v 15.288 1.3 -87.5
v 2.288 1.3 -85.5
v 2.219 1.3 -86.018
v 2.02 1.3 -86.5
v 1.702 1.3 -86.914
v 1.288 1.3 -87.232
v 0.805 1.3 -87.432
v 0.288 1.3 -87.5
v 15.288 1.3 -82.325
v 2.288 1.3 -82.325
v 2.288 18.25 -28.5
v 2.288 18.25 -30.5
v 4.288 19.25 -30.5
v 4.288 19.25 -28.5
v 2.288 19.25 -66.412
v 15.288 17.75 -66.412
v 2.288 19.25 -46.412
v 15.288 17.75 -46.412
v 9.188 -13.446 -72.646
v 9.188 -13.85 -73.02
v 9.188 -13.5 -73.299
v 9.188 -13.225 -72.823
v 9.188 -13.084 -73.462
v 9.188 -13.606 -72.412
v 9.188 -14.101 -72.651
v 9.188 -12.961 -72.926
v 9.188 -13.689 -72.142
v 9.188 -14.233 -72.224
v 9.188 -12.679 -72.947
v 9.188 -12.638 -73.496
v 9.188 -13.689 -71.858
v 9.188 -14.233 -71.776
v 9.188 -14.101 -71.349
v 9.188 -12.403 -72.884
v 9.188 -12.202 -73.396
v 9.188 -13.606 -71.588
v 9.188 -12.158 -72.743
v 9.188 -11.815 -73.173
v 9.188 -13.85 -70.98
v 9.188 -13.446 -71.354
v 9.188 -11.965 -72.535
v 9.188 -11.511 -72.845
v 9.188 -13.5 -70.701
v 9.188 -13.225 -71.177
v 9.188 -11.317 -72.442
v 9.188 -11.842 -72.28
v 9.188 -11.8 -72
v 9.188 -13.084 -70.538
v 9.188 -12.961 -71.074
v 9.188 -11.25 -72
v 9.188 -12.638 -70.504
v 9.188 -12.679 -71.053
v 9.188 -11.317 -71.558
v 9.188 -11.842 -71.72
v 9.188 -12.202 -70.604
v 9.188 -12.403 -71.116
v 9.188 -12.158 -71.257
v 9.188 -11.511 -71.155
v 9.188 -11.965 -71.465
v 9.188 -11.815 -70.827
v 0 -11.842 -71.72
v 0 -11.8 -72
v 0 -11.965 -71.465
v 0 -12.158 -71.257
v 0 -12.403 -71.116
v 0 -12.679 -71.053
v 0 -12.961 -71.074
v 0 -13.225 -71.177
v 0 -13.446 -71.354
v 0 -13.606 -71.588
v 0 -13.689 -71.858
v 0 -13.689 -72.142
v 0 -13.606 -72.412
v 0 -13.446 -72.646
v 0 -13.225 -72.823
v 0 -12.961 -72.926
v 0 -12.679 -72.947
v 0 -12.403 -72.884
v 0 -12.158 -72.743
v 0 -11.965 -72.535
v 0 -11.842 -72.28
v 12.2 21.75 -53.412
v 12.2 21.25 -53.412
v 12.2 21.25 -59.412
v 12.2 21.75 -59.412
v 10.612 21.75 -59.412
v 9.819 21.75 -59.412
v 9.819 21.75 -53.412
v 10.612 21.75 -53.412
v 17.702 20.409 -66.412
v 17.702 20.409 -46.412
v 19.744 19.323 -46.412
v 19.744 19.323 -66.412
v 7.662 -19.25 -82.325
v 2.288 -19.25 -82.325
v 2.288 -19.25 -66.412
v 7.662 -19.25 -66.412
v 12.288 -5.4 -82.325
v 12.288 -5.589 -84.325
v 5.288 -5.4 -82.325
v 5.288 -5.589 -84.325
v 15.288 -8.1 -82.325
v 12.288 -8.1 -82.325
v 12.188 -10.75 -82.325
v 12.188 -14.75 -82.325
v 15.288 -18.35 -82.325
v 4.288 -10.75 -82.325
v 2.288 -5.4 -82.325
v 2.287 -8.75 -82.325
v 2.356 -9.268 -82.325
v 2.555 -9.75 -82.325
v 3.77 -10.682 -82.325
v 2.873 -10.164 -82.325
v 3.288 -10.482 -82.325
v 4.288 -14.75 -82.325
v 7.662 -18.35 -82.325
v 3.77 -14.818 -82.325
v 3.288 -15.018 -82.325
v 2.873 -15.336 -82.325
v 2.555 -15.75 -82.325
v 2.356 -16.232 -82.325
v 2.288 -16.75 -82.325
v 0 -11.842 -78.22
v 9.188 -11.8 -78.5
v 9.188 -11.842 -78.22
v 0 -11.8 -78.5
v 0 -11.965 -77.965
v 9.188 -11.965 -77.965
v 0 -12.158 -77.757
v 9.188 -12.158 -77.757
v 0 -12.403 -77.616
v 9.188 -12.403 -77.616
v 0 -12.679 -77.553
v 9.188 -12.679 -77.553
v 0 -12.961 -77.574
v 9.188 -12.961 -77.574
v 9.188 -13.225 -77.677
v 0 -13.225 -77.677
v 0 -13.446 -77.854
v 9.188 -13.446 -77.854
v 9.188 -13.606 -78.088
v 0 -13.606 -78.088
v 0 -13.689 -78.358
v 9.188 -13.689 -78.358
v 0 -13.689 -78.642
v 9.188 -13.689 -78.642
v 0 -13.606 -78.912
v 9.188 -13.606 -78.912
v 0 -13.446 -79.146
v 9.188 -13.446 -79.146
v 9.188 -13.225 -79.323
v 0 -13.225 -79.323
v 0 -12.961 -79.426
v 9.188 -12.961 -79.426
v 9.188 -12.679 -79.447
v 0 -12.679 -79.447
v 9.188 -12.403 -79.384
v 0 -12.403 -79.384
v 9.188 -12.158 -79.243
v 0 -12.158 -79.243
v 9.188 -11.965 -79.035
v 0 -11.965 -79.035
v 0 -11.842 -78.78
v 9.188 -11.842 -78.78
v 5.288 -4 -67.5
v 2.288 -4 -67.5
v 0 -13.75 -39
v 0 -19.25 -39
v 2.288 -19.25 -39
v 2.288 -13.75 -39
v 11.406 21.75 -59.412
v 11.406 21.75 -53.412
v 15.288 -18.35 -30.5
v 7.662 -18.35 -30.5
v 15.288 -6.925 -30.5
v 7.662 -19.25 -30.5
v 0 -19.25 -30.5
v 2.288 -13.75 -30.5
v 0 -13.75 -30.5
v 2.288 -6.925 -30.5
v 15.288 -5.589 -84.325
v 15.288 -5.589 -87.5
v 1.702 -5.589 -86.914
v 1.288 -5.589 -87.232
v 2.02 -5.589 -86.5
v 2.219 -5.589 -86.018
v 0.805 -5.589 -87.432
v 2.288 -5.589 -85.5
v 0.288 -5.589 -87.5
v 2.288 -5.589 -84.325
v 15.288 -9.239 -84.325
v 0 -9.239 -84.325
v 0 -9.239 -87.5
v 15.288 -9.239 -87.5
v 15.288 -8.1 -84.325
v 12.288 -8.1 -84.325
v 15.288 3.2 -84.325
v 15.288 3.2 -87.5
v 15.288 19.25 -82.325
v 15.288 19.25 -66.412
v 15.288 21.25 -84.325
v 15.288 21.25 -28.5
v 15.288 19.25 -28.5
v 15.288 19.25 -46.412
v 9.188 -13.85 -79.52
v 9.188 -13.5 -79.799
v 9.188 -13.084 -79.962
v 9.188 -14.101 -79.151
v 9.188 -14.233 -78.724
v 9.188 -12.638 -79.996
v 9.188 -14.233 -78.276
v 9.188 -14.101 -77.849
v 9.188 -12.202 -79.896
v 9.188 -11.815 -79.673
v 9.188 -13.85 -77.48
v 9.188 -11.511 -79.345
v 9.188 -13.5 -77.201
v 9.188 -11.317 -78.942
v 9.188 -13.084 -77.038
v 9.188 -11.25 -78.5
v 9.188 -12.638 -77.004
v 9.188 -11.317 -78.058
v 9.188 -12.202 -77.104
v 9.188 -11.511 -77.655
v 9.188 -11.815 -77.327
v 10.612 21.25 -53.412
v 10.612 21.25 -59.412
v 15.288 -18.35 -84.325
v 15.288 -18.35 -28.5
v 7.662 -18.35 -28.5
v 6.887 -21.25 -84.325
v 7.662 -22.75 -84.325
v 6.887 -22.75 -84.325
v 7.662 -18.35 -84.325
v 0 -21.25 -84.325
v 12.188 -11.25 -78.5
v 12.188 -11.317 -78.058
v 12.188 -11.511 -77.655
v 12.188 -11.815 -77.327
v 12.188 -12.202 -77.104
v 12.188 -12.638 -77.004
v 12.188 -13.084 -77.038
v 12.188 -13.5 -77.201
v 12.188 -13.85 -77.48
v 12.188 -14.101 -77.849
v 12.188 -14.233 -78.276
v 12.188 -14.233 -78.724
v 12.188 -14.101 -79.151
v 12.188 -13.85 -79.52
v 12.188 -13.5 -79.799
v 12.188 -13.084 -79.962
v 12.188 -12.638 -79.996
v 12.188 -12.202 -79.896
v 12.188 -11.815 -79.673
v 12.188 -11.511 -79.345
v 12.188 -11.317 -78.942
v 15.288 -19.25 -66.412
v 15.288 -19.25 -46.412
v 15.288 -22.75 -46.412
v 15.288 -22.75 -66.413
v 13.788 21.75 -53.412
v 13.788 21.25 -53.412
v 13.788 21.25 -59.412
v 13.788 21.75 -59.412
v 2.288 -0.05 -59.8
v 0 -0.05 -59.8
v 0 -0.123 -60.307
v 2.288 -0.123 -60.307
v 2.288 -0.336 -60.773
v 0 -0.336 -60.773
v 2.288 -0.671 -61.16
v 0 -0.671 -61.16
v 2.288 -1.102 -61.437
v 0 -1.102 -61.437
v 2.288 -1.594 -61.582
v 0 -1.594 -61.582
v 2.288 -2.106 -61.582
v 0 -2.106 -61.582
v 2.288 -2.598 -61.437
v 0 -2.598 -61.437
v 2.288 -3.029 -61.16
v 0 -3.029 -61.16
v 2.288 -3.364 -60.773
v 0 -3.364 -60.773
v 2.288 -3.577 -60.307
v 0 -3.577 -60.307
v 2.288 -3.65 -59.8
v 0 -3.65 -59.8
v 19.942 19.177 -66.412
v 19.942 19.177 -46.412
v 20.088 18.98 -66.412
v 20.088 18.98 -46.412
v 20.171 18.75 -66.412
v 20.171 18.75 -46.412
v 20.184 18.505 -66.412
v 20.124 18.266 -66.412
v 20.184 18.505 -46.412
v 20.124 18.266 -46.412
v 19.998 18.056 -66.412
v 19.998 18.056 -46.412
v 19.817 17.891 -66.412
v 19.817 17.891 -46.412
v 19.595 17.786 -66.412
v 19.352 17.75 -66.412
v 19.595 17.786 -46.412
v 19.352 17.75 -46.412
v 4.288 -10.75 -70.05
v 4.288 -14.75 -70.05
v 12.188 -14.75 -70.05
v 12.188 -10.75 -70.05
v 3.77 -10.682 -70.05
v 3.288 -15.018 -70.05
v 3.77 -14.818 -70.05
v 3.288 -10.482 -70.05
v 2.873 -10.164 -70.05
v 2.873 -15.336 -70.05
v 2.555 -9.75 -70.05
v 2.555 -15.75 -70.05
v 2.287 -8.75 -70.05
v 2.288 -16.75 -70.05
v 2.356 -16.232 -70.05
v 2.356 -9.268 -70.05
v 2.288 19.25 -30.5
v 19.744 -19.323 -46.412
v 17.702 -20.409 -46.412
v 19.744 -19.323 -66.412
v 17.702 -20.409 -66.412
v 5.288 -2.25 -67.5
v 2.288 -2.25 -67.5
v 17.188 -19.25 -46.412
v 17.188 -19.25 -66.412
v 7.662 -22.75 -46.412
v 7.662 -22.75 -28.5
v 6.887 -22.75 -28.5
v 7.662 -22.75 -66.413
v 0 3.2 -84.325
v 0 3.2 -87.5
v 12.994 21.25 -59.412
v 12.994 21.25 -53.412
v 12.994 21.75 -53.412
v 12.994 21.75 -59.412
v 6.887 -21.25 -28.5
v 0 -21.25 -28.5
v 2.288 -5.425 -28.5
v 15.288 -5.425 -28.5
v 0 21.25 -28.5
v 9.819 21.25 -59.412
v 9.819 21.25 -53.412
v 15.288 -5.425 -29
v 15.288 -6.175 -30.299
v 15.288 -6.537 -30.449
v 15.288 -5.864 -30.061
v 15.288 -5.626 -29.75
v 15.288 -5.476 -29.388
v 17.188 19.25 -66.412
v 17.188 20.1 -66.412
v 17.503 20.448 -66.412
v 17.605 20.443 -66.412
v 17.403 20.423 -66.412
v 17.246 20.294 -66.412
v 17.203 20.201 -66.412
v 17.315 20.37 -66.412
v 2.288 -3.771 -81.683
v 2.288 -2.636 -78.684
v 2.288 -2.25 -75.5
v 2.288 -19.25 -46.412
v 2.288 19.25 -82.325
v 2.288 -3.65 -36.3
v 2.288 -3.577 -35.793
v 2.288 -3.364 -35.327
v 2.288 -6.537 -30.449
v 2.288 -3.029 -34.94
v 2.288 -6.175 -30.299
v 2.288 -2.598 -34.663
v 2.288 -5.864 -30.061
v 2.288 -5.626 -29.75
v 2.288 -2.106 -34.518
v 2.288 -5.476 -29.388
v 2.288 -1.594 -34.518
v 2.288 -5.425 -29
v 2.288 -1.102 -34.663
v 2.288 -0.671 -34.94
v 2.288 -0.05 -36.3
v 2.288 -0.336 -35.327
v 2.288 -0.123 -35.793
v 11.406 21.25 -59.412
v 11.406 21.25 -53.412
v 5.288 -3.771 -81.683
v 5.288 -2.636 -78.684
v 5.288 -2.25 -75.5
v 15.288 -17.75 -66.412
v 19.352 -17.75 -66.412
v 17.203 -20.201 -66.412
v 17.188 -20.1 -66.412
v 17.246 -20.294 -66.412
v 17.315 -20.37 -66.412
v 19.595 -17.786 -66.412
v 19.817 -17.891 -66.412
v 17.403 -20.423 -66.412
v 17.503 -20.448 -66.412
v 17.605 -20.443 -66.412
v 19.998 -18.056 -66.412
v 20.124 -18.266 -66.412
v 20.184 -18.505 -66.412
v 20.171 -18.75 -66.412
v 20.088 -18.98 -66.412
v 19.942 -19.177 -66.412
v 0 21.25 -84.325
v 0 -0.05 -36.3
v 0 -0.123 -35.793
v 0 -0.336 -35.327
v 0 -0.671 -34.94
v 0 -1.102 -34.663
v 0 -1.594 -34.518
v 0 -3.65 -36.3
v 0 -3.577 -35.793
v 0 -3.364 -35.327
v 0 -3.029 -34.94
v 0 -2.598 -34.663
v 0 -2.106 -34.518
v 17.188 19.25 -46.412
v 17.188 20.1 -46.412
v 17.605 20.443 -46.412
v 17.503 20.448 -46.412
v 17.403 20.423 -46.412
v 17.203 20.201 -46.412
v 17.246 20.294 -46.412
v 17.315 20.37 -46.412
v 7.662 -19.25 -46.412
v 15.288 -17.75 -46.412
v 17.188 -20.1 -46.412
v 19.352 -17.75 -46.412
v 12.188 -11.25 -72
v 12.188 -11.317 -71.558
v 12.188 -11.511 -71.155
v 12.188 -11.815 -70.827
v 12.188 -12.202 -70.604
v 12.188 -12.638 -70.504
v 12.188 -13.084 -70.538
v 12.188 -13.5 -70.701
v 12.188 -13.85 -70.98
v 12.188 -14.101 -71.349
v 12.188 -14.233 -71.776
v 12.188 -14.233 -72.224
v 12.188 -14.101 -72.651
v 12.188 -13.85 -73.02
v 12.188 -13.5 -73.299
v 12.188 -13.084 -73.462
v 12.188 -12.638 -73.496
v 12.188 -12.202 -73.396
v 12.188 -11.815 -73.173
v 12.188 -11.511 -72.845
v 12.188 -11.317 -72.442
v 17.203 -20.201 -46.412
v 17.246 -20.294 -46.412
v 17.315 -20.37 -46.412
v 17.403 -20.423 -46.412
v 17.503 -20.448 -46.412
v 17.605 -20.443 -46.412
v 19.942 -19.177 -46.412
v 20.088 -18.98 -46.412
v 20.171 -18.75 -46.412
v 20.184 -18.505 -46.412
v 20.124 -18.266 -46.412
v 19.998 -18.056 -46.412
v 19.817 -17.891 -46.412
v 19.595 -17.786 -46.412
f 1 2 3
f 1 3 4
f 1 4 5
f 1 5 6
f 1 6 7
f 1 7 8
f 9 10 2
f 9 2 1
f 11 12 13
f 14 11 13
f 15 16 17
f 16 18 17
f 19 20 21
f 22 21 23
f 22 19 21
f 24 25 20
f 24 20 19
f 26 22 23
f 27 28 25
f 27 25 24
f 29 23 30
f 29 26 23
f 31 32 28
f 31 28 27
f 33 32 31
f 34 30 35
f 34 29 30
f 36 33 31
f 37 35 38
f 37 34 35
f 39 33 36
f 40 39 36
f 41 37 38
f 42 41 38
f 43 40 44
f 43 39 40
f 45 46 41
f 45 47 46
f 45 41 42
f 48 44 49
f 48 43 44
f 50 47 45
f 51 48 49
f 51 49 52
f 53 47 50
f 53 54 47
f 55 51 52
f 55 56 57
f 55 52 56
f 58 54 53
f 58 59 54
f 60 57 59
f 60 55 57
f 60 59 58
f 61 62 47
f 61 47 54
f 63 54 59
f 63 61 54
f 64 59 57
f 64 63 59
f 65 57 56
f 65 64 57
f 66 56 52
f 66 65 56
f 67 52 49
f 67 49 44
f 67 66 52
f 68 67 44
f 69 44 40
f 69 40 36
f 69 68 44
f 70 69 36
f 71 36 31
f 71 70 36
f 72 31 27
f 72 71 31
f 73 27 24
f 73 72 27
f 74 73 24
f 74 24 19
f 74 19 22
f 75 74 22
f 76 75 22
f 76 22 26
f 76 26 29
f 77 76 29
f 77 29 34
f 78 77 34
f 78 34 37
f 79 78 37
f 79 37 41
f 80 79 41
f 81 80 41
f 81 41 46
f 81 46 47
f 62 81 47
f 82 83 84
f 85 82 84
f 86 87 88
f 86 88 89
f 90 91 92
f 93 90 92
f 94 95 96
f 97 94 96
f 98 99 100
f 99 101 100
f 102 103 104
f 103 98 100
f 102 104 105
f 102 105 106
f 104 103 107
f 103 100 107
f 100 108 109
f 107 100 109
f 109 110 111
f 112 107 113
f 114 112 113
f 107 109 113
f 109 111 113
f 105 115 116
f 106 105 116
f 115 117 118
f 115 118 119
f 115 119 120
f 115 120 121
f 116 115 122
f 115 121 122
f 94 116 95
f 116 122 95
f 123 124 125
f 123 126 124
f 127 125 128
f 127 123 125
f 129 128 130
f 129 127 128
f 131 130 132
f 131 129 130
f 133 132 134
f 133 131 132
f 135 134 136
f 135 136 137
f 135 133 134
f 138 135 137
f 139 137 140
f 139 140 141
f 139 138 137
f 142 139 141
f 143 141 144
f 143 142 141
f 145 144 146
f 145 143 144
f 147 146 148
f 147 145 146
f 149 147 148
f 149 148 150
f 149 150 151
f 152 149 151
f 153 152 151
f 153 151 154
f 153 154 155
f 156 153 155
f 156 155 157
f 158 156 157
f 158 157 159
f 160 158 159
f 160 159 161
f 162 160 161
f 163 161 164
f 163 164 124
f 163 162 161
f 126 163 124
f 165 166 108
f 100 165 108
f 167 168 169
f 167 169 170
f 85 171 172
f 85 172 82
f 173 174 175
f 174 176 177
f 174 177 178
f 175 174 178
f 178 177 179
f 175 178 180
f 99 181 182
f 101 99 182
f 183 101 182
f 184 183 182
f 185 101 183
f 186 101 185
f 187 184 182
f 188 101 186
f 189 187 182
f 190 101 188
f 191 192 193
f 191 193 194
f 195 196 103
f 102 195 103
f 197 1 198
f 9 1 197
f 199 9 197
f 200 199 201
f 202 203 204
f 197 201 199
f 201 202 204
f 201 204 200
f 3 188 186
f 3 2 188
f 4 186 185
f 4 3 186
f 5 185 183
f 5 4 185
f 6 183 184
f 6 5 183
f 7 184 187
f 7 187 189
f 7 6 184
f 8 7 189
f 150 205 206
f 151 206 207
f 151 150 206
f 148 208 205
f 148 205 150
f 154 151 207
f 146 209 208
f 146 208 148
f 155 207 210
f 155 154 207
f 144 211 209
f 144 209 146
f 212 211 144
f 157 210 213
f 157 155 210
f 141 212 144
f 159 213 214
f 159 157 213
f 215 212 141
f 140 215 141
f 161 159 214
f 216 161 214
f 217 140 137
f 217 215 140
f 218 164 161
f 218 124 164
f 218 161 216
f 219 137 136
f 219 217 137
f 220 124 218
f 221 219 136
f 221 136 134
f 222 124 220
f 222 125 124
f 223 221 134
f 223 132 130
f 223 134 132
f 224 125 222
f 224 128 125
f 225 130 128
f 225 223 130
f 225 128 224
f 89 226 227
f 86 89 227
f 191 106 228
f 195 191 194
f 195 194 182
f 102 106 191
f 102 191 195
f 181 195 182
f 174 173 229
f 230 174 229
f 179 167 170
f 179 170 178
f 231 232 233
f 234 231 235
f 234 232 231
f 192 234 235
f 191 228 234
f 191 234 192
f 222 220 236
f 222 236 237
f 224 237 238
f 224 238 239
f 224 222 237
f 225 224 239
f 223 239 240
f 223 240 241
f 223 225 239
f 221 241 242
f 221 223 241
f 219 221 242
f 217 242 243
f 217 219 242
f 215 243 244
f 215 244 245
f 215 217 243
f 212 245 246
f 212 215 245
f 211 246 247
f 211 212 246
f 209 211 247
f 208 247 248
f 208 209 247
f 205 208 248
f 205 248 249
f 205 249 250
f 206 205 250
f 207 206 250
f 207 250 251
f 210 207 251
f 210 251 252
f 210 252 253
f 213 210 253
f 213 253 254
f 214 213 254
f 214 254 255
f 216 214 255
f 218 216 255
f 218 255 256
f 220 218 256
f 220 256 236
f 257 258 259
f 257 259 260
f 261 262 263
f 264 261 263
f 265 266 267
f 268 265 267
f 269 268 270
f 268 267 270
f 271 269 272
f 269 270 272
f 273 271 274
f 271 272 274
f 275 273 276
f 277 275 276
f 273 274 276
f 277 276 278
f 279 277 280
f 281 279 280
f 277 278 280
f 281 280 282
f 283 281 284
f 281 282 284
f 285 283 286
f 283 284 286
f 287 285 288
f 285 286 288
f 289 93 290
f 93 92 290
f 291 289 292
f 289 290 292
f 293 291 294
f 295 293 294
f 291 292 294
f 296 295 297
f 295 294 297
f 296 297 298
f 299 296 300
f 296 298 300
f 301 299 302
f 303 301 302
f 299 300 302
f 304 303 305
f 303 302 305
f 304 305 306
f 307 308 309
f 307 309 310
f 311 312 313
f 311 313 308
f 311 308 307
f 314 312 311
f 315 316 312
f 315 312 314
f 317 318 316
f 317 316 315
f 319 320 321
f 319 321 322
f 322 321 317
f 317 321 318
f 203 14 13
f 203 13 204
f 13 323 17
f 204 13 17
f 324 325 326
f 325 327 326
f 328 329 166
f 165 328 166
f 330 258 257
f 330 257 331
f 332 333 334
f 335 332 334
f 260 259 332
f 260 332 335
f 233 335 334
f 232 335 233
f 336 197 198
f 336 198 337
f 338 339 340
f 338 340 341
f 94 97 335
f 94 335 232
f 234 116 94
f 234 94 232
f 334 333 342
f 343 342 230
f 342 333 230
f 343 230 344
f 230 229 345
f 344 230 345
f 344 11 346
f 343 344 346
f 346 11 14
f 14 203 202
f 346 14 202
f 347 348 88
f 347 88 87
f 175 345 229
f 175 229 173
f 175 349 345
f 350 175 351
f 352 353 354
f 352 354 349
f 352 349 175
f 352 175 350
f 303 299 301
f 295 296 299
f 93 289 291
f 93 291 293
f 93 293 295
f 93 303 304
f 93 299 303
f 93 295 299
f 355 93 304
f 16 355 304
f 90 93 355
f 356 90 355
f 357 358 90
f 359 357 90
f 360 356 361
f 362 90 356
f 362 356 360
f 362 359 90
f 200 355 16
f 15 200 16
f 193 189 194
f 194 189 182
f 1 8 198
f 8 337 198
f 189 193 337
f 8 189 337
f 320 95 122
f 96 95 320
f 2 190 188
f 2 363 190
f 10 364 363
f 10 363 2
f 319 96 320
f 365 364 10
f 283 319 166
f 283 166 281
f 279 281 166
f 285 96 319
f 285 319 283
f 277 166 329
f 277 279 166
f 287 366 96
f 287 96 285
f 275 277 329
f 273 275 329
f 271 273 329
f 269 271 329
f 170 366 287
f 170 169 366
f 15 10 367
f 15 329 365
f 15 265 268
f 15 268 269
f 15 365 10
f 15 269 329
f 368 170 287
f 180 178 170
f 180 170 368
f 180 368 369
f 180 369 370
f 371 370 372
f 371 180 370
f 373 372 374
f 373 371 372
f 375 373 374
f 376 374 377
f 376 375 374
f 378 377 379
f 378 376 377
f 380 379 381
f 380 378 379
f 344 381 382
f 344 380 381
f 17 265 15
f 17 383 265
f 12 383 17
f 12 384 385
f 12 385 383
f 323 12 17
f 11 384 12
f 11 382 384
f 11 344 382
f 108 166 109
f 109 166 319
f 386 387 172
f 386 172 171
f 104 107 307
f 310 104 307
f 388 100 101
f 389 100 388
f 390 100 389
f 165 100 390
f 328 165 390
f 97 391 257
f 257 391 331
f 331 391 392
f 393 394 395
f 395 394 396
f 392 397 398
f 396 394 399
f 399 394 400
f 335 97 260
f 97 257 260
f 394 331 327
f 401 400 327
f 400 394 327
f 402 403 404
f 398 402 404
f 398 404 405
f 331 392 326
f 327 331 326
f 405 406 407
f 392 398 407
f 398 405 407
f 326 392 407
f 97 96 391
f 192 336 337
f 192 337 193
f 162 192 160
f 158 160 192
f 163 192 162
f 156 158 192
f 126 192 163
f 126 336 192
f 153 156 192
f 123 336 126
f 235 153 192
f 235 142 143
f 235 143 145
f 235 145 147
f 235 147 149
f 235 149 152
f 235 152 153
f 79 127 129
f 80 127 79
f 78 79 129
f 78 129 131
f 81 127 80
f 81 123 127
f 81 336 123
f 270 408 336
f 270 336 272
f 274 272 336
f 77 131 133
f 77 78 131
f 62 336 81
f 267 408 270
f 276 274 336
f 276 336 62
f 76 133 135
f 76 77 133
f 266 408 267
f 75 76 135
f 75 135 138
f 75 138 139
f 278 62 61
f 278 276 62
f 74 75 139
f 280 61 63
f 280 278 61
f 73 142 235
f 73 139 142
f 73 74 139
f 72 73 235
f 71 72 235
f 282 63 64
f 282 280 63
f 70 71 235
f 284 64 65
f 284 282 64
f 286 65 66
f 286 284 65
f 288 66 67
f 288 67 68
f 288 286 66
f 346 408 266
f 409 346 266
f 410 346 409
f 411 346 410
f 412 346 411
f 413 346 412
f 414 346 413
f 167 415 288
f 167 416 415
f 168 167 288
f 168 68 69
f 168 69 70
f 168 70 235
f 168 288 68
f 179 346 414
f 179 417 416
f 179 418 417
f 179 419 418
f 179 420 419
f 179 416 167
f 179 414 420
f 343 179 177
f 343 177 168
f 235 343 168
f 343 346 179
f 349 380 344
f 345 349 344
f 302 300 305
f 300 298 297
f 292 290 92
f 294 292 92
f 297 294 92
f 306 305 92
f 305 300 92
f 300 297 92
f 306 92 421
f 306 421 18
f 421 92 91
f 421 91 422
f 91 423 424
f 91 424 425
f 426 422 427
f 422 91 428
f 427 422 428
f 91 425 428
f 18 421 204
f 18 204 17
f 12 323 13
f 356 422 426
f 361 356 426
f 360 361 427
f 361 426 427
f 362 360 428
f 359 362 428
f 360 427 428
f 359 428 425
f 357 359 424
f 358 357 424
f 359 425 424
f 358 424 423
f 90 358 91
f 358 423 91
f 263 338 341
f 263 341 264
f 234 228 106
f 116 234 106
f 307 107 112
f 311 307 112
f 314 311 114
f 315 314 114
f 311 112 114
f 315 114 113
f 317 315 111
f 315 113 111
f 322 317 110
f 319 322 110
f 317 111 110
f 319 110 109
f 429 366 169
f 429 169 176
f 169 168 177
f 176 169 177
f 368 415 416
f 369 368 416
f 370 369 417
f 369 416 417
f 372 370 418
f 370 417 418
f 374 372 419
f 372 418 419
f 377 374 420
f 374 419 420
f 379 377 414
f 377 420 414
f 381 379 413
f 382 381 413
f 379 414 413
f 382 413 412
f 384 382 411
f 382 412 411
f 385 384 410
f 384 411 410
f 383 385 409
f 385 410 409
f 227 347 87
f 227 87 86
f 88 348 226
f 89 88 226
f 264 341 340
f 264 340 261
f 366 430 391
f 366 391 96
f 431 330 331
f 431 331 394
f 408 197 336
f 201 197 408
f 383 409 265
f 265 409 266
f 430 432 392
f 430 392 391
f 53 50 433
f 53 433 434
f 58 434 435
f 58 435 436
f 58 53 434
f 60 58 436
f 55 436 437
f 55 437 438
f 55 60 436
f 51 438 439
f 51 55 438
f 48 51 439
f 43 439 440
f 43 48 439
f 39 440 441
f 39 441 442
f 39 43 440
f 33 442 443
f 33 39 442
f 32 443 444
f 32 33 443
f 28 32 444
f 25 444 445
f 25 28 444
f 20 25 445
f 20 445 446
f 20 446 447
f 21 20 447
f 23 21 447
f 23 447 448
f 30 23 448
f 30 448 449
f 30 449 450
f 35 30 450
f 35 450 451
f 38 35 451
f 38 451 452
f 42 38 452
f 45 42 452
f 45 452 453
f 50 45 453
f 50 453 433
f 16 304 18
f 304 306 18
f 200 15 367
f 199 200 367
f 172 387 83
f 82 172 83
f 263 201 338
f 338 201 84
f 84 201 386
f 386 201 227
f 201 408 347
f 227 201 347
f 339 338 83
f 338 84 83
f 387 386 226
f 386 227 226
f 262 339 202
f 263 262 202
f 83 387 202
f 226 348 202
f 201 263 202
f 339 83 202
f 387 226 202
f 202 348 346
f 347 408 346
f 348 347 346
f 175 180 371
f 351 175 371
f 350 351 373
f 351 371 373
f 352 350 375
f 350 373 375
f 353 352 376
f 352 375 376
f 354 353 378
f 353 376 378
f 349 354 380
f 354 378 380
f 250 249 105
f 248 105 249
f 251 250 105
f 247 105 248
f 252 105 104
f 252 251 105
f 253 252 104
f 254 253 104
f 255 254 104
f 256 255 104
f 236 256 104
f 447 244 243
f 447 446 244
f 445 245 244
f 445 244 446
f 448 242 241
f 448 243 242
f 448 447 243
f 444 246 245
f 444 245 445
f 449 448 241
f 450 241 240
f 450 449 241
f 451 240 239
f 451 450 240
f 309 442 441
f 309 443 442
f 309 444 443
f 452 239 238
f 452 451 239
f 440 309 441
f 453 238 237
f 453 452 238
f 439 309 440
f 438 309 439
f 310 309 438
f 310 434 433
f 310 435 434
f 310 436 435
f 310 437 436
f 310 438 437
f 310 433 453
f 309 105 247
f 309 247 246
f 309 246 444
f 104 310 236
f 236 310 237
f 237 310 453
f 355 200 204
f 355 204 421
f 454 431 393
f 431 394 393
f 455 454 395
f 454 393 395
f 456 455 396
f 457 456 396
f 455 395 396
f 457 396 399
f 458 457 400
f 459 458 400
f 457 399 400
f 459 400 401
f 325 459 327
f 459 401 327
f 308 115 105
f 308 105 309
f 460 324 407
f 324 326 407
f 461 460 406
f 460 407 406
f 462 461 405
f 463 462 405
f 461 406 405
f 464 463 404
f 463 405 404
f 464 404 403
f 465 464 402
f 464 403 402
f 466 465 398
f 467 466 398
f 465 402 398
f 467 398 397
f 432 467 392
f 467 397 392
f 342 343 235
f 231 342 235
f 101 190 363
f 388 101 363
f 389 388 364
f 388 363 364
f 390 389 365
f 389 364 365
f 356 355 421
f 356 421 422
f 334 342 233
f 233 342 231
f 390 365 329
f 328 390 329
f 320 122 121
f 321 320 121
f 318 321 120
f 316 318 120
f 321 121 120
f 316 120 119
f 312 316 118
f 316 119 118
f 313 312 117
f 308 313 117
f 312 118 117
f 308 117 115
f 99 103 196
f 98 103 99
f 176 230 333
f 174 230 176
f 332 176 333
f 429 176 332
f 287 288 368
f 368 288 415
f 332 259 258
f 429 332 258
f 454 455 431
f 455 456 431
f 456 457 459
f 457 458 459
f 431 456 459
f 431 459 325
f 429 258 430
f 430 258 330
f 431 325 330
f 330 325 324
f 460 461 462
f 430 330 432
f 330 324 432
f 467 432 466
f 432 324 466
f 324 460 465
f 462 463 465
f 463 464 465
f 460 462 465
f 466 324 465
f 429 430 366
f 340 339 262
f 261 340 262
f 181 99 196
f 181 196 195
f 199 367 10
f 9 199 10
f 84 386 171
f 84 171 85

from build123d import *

# Parameters (mm, degrees)
MAIN_EXTRUDE_DEPTH            = 2.2875
WALLS_START                   = 2.2875
WALLS_DEPTH                   = 13
CORNER_SUPPORT_DEPTH          = 2
SKETCH2_R                     = 0.95
SKETCH2_W                     = 2.4
SKETCH2_H                     = 4
SKETCH2_W_2                   = 1
SWITCH_SPACER_DEPTH           = 9.9
ARM_SUPPORT_EXTRUDE_DEPTH     = 3
ARM_SUPPORT_CURVE_DEPTH       = 40.380356778
FILLET4_R                     = 2
FILLET3_R                     = 2
SKETCH2_5_R                   = 0.95
SWITCH_MOUNT_HOLES_DEPTH      = 40.380356889
SKETCH35_R                    = 1.5
SWITCH_MOUNT_EXIT_HOLES_DEPTH = 3
SKETCH4_W                     = 8.5
SKETCH4_H                     = 5.5
WIRE_HOLE_DEPTH               = 40.380356889
SKETCH25_W                    = 6
SKETCH25_H                    = 1.35
FEMALE_SNAP_DEPTH             = 10.125
SKETCH5_W                     = 30
SKETCH5_H                     = 12.75
SERVO_HOLE_DEPTH              = 40.380356889
MAGNET_EXTRUDE_1_DEPTH        = 7.625
MAGNET_EXTRUDE_1_DEPTH_BACK   = 8.2
SKETCH30_W                    = 15.7875
SKETCH30_H                    = 0.9
SKETCH30_W_2                  = 17.7875
SKETCH30_H_2                  = 1.5
SKETCH29_R                    = 7.7
MAGNET_HOLE_DEPTH             = 2.1
SKETCH31_R                    = 5.5
MAGNET_THRU_HOLE_DEPTH        = 58.632218961
SKETCH39_W                    = 3.175
SKETCH39_H                    = 12.55
CUT_EXTRUDE1_DEPTH            = 45.416158798
CUT_EXTRUDE2_DEPTH            = 42.895144408
BOSS_EXTRUDE2_DEPTH           = 10
MIRROR1_OUTLINE_W             = 42.5
MIRROR1_OUTLINE_H             = 55.825
MIRROR1_OUTLINE_W_2           = 5.5
MIRROR1_OUTLINE_H_2           = 8.5
MIRROR1_OUTLINE_R             = 0.95
MIRROR1_DEPTH                 = 2.2875
MIRROR1_START                 = 2.2875
MIRROR1_2_DEPTH               = 13
MIRROR1_3_OUTLINE_W           = 4
MIRROR1_3_OUTLINE_H           = 12.275
MIRROR1_3_OUTLINE_R           = 1.5
MIRROR1_3_DEPTH               = 9.9
MIRROR1_4_OUTLINE_R           = 1.5
MIRROR1_4_OUTLINE_R_2         = 0.95
MIRROR1_4_DEPTH               = 3
MIRROR1_START_2               = 5.2875
MIRROR1_5_OUTLINE_R           = 1.5
MIRROR1_5_OUTLINE_R_2         = 0.95
MIRROR1_5_DEPTH               = 3.9
MIRROR1_START_3               = 12.1875
MIRROR1_6_DEPTH               = 0.1
MIRROR1_START_4               = -84.325
MIRROR1_7_DEPTH               = 14.275
MIRROR1_START_5               = -30.5
MIRROR1_8_DEPTH               = 2
SKETCH6_W                     = 59
SKETCH6_H                     = 44
MIRROR_CUT_DEPTH              = 91.295353043
MALE_SNAP_DEPTH               = 10
SKETCH34_W                    = 55.825
SKETCH34_H                    = 1.5
MAGNET_EXTRUDE_DEPTH          = 8.4
SKETCH34_5_W                  = 15.9125
SKETCH34_5_H                  = 0.9
SKETCH34_5_W_2                = 17.9125
SKETCH34_5_H_2                = 1.5
MAGNET_BOTTOM_CUT_DEPTH       = 7.625
SKETCH36_W                    = 0.79375
SKETCH36_H                    = 6
BOSS_EXTRUDE1_DEPTH           = 0.5
BOSS_EXTRUDE5_DEPTH           = 3.175
FILLET7_R                     = 2


with BuildPart() as part:
    # Sketch1 → Main Extrude (new body)
    with BuildSketch(Plane(origin=(0, 0, 0), x_dir=(0, 0, -1), z_dir=(1, 0, 0))):
        Polygon((-30.5, -9.35), (-27.325, -9.35), (-27.325, -21.25), (28.5, -21.25), (28.5, 21.25), (-27.325, 21.25), (-27.325, 3.2), (-30.5, 3.2), align=None)
        with BuildLine():
            Line((20.7, -3.65), (-2.8, -3.65))
            ThreePointArc((-2.8, -3.65), (-4.6, -1.85), (-2.8, -0.05))
            Line((-2.8, -0.05), (20.7, -0.05))
            ThreePointArc((20.7, -0.05), (22.5, -1.85), (20.7, -3.65))
        make_face(mode=Mode.SUBTRACT)
    extrude(amount=MAIN_EXTRUDE_DEPTH)

    # Sketch1<3> → Walls (add)
    with BuildSketch(Plane(origin=(0, 0, 0), x_dir=(0, 0, -1), z_dir=(1, 0, 0)).offset(WALLS_START)):
        Polygon((-25.325, 19.25), (28.5, 19.25), (28.5, 21.25), (-27.325, 21.25), (-27.325, 3.2), (-30.5, 3.2), (-30.5, 1.3), (-25.325, 1.3), align=None)
        with BuildLine():
            Line((28.5, -5.425), (28, -5.425))
            ThreePointArc((28, -5.425), (26.939339828, -5.864339828), (26.5, -6.925))
            Line((26.5, -6.925), (26.5, -19.25))
            Line((26.5, -19.25), (-25.325, -19.25))
            Line((-25.325, -19.25), (-25.325, -8.1))
            Line((-25.325, -8.1), (-28.5, -8.1))
            Line((-28.5, -8.1), (-28.5, -4.45))
            Line((-28.5, -4.45), (-30.5, -4.45))
            Line((-30.5, -4.45), (-30.5, -9.35))
            Line((-30.5, -9.35), (-27.325, -9.35))
            Line((-27.325, -9.35), (-27.325, -21.25))
            Line((-27.325, -21.25), (28.5, -21.25))
            Line((28.5, -21.25), (28.5, -5.425))
        make_face()
    extrude(amount=WALLS_DEPTH)

    # Sketch22 → Corner Support (add)
    with BuildSketch(Plane(origin=(0, 0, -28.5), x_dir=(-1, 0, 0), z_dir=(0, 0, -1))):
        Polygon((-4.2875, 19.25), (-2.2875, 18.25), (-2.2875, 19.25), align=None)
    extrude(amount=-CORNER_SUPPORT_DEPTH)

    # Sketch2 → Switch Spacer (add)
    # profile 1 of 7: a face of its own
    with BuildSketch(Plane(origin=(2.2875, 0, 0), x_dir=(0, 0, -1), z_dir=(1, 0, 0))):
        Polygon((-14.05, -10.75), (-17.05, -10.75), (-17.05, -14.75), (-14.05, -14.75), (-14.05, -12.75), align=None)
        with Locations((-15, -12.75)):
            Circle(SKETCH2_R, mode=Mode.SUBTRACT)
    # profile 2 of 7: a face of its own
    with BuildSketch(Plane(origin=(2.2875, 0, 0), x_dir=(0, 0, -1), z_dir=(1, 0, 0))):
        with Locations((-15, -12.75)):
            Circle(SKETCH2_R)
    # profile 3 of 7: a face of its own
    with BuildSketch(Plane(origin=(2.2875, 0, 0), x_dir=(0, 0, -1), z_dir=(1, 0, 0))):
        Polygon((-19.45, -10.75), (-22.45, -10.75), (-22.45, -12.75), (-22.45, -14.75), (-19.45, -14.75), align=None)
        with BuildLine():
            ThreePointArc((-20.55, -12.75), (-21.5, -13.7), (-22.45, -12.75))
            ThreePointArc((-22.45, -12.75), (-21.5, -11.8), (-20.55, -12.75))
        make_face(mode=Mode.SUBTRACT)
    # profile 4 of 7: a face of its own
    with BuildSketch(Plane(origin=(2.2875, 0, 0), x_dir=(0, 0, -1), z_dir=(1, 0, 0))):
        with Locations((-21.5, -12.75)):
            Circle(SKETCH2_R)
    # profile 5 of 7: a face of its own
    with BuildSketch(Plane(origin=(2.2875, 0, 0), x_dir=(0, 0, -1), z_dir=(1, 0, 0))):
        Polygon((-22.45, -12.75), (-22.45, -10.75), (-25.325, -10.75), (-25.325, -14.75), (-22.45, -14.75), align=None)
    # profile 6 of 7: a face of its own
    with BuildSketch(Plane(origin=(2.2875, 0, 0), x_dir=(0, 0, -1), z_dir=(1, 0, 0))):
        with Locations((-18.25, -12.75)):
            Rectangle(SKETCH2_W, SKETCH2_H)
    # profile 7 of 7: a face of its own
    with BuildSketch(Plane(origin=(2.2875, 0, 0), x_dir=(0, 0, -1), z_dir=(1, 0, 0))):
        with Locations((-13.55, -12.75)):
            Rectangle(SKETCH2_W_2, SKETCH2_H)
    extrude(amount=SWITCH_SPACER_DEPTH)

    # Sketch3 → Arm Support Extrude (add)
    with BuildSketch(Plane(origin=(2.2875, 0, 0), x_dir=(0, 0, -1), z_dir=(1, 0, 0))):
        with BuildLine():
            Line((-18.5, -2.25), (-10.5, -2.25))
            Line((-10.5, -2.25), (-10.5, -4))
            Line((-10.5, -4), (-28.5, -5.7))
            Line((-28.5, -5.7), (-30.5, -5.7))
            ThreePointArc((-30.5, -5.7), (-24.743046131, -3.129622151), (-18.5, -2.25))
        make_face()
    extrude(amount=ARM_SUPPORT_EXTRUDE_DEPTH)

    # Sketch7 → Arm Support Curve (cut, through all)
    with BuildSketch(Plane(origin=(2.2875, 0, 0), x_dir=(0, 0, -1), z_dir=(1, 0, 0))):
        with BuildLine():
            Line((-28.5, -4.583410824), (-28.5, -4.45))
            Line((-28.5, -4.45), (-30.5, -4.45))
            Line((-30.5, -4.45), (-30.5, -5.7))
            ThreePointArc((-30.5, -5.7), (-29.627655409, -5.180138898), (-28.73283292, -4.7))
            ThreePointArc((-28.73283292, -4.7), (-28.616584416, -4.641369997), (-28.5, -4.583410824))
        make_face()
    extrude(amount=ARM_SUPPORT_CURVE_DEPTH, mode=Mode.SUBTRACT)

    # Fillet4
    fillet4_edges = [part.edges().sort_by_distance(p)[0] for p in [
        (2.2875, -2.2, 30.5),
    ]]
    fillet(fillet4_edges, radius=FILLET4_R)

    # Fillet3
    fillet3_edges = [part.edges().sort_by_distance(p)[0] for p in [
        (2.2875, -14.75, 19.1875),
        (2.2875, -10.75, 19.1875),
    ]]
    fillet(fillet3_edges, radius=FILLET3_R)

    # Sketch2<5> → Switch Mount Holes (cut, symmetric)
    with BuildSketch(Plane(origin=(2.2875, 0, 0), x_dir=(0, 0, -1), z_dir=(1, 0, 0))):
        with Locations((-21.5, -12.75)):
            Circle(SKETCH2_5_R)
        with Locations((-15, -12.75)):
            Circle(SKETCH2_5_R)
    extrude(amount=SWITCH_MOUNT_HOLES_DEPTH, both=True, mode=Mode.SUBTRACT)

    # Sketch35 → Switch Mount Exit Holes (cut)
    with BuildSketch(Plane(origin=(12.1875, 0, 0), x_dir=(0, 0, -1), z_dir=(1, 0, 0))):
        with Locations((-21.5, -12.75)):
            Circle(SKETCH35_R)
        with Locations((-15, -12.75)):
            Circle(SKETCH35_R)
    extrude(amount=-SWITCH_MOUNT_EXIT_HOLES_DEPTH, mode=Mode.SUBTRACT)

    # Sketch4 → Wire Hole (cut, through all)
    with BuildSketch(Plane(origin=(2.2875, 0, 0), x_dir=(0, 0, -1), z_dir=(1, 0, 0))):
        with Locations((22.25, -16.5)):
            Rectangle(SKETCH4_W, SKETCH4_H)
    extrude(amount=-WIRE_HOLE_DEPTH, mode=Mode.SUBTRACT)

    # Sketch25 → Female Snap (cut, symmetric)
    with BuildSketch(Plane(origin=(0, 0, -0.5875), x_dir=(-1, 0, 0), z_dir=(0, 0, -1))):
        with Locations((-11.0375, -19.925)):
            Rectangle(SKETCH25_W, SKETCH25_H)
        Polygon((-15.2875, -19.25), (-15.2875, -19.91463679), (-14.0375, -19.25), align=None)
        with Locations((-11.0375, 19.925)):
            Rectangle(SKETCH25_W, SKETCH25_H)
        Polygon((-15.2875, 19.91463679), (-15.2875, 19.25), (-14.0375, 19.25), align=None)
    extrude(amount=FEMALE_SNAP_DEPTH, both=True, mode=Mode.SUBTRACT)

    # Sketch5 → Servo Hole (cut, through all)
    with BuildSketch(Plane(origin=(2.2875, 0, 0), x_dir=(0, 0, -1), z_dir=(1, 0, 0))):
        with Locations((7.35, 9.675)):
            Rectangle(SKETCH5_W, SKETCH5_H)
        with BuildLine():
            Line((-8.75, 10.675), (-8.75, 8.675))
            ThreePointArc((-8.75, 8.675), (-10.3, 7.125), (-11.85, 8.675))
            Line((-11.85, 8.675), (-11.85, 10.675))
            ThreePointArc((-11.85, 10.675), (-10.3, 12.225), (-8.75, 10.675))
        make_face()
        with BuildLine():
            Line((26.55, 10.675), (26.55, 8.675))
            ThreePointArc((26.55, 8.675), (25, 7.125), (23.45, 8.675))
            Line((23.45, 8.675), (23.45, 10.675))
            ThreePointArc((23.45, 10.675), (25, 12.225), (26.55, 10.675))
        make_face()
    extrude(amount=-SERVO_HOLE_DEPTH, mode=Mode.SUBTRACT)

    # Sketch30 → Magnet Extrude 1 (add, two sides: drawn at the far end of the back side and taken through both)
    with BuildSketch(Plane(origin=(15.2875, 0, 0), x_dir=(0, 0, -1), z_dir=(1, 0, 0)).offset(-MAGNET_EXTRUDE_1_DEPTH_BACK)):
        Polygon((-27.325, -18.35), (-27.325, -21.25), (-9.5375, -21.25), (-9.5375, -19.91463679), (-9.5375, -19.25), (-25.325, -19.25), (-25.325, -18.35), align=None)
        with Locations((-17.43125, -18.8)):
            Rectangle(SKETCH30_W, SKETCH30_H)
        with Locations((19.60625, -22)):
            Rectangle(SKETCH30_W_2, SKETCH30_H_2)
        Polygon((10.7125, -19.91463679), (10.7125, -21.25), (28.5, -21.25), (28.5, -18.35), (26.5, -18.35), (26.5, -19.25), (10.7125, -19.25), align=None)
        with Locations((-18.43125, -22)):
            Rectangle(SKETCH30_W_2, SKETCH30_H_2)
        with Locations((18.60625, -18.8)):
            Rectangle(SKETCH30_W, SKETCH30_H)
    extrude(amount=MAGNET_EXTRUDE_1_DEPTH + MAGNET_EXTRUDE_1_DEPTH_BACK)

    # Sketch29 → Magnet Hole (cut)
    with BuildSketch(Plane(origin=(0, -21.95, 0), x_dir=(1, 0, 0), z_dir=(0, 1, 0))):
        with Locations((15.2875, -17.625)):
            Circle(SKETCH29_R)
        with BuildLine():
            ThreePointArc((22.9125, -18.697089082), (20.338980677, -23.436414885), (15.2875, -25.325))
            Line((15.2875, -25.325), (22.9125, -25.325))
            Line((22.9125, -25.325), (22.9125, -18.697089082))
        make_face()
        with BuildLine():
            Line((22.9125, -9.925), (15.2875, -9.925))
            ThreePointArc((15.2875, -9.925), (20.338980677, -11.813585115), (22.9125, -16.552910918))
            Line((22.9125, -16.552910918), (22.9125, -9.925))
        make_face()
        with Locations((15.2875, 19.4)):
            Circle(SKETCH29_R)
        with BuildLine():
            ThreePointArc((22.9125, 18.327910918), (20.338980677, 13.588585115), (15.2875, 11.7))
            Line((15.2875, 11.7), (22.9125, 11.7))
            Line((22.9125, 11.7), (22.9125, 18.327910918))
        make_face()
        with BuildLine():
            Line((22.9125, 27.1), (15.2875, 27.1))
            ThreePointArc((15.2875, 27.1), (20.338980677, 25.211414885), (22.9125, 20.472089082))
            Line((22.9125, 20.472089082), (22.9125, 27.1))
        make_face()
        with BuildLine():
            ThreePointArc((22.9875, -17.625), (22.968727116, -17.087645368), (22.9125, -16.552910918))
            Line((22.9125, -16.552910918), (22.9125, -18.697089082))
            ThreePointArc((22.9125, -18.697089082), (22.968727116, -18.162354632), (22.9875, -17.625))
        make_face()
        with BuildLine():
            Line((22.9125, 20.472089082), (22.9125, 18.327910918))
            ThreePointArc((22.9125, 18.327910918), (22.968727116, 18.862645368), (22.9875, 19.4))
            ThreePointArc((22.9875, 19.4), (22.968727116, 19.937354632), (22.9125, 20.472089082))
        make_face()
    extrude(amount=MAGNET_HOLE_DEPTH, mode=Mode.SUBTRACT)

    # Sketch31 → Magnet Thru Hole (cut, through all)
    with BuildSketch(Plane.XZ.offset(21.95)):
        with Locations((15.2875, 17.625)):
            Circle(SKETCH31_R)
        with BuildLine():
            Line((22.9125, 23.125), (15.2875, 23.125))
            ThreePointArc((15.2875, 23.125), (19.176587297, 21.514087297), (20.7875, 17.625))
            ThreePointArc((20.7875, 17.625), (19.176587297, 13.735912703), (15.2875, 12.125))
            Line((15.2875, 12.125), (22.9125, 12.125))
            Line((22.9125, 12.125), (22.9125, 23.125))
        make_face()
        with Locations((15.2875, -19.4)):
            Circle(SKETCH31_R)
        with BuildLine():
            Line((22.9125, -13.9), (15.2875, -13.9))
            ThreePointArc((15.2875, -13.9), (19.176587297, -15.510912703), (20.7875, -19.4))
            ThreePointArc((20.7875, -19.4), (19.176587297, -23.289087297), (15.2875, -24.9))
            Line((15.2875, -24.9), (22.9125, -24.9))
            Line((22.9125, -24.9), (22.9125, -13.9))
        make_face()
    extrude(amount=MAGNET_THRU_HOLE_DEPTH, mode=Mode.SUBTRACT)

    # Sketch39 → Cut-Extrude1 (cut, through all)
    with BuildSketch(Plane.ZY):
        with Locations((28.9125, -3.075)):
            Rectangle(SKETCH39_W, SKETCH39_H)
    extrude(amount=-CUT_EXTRUDE1_DEPTH, mode=Mode.SUBTRACT)

    # Sketch40 → Cut-Extrude2 (cut, through all)
    with BuildSketch(Plane(origin=(2.2875, 0, 0), x_dir=(0, 0, -1), z_dir=(1, 0, 0))):
        with BuildLine():
            Line((-27.325, -5.589027778), (-27.325, -4.044715402))
            ThreePointArc((-27.325, -4.044715402), (-23.002822125, -2.703224466), (-18.5, -2.25))
            ThreePointArc((-18.5, -2.25), (-23.217778383, -3.112667731), (-27.325, -5.589027778))
        make_face()
    extrude(amount=CUT_EXTRUDE2_DEPTH, mode=Mode.SUBTRACT)

    # Sketch41 → Boss-Extrude2 (add)
    with BuildSketch(Plane(origin=(2.2875, 0, 0), x_dir=(0, 0, -1), z_dir=(1, 0, 0))):
        Polygon((-25.325, -8.1), (-27.325, -8.1), (-27.325, -5.589027778), (-25.325, -5.400138889), align=None)
    extrude(amount=BOSS_EXTRUDE2_DEPTH)

    # Mirror1: read off the stored shape, not the designer's step
    # Mirror1 outline → Mirror1 (add)
    with BuildSketch(Plane.YZ):
        with Locations((0, -56.4125)):
            Rectangle(MIRROR1_OUTLINE_W, MIRROR1_OUTLINE_H)
        with Locations((-16.5, -34.75)):
            Rectangle(MIRROR1_OUTLINE_W_2, MIRROR1_OUTLINE_H_2, mode=Mode.SUBTRACT)
        with BuildLine():
            ThreePointArc((-0.05, -59.8), (-1.85, -61.6), (-3.65, -59.8))
            Line((-3.65, -59.8), (-3.65, -36.3))
            ThreePointArc((-3.65, -36.3), (-1.85, -34.5), (-0.05, -36.3))
            Line((-0.05, -36.3), (-0.05, -59.8))
        make_face(mode=Mode.SUBTRACT)
        with Locations((-12.75, -72)):
            Circle(MIRROR1_OUTLINE_R, mode=Mode.SUBTRACT)
        with Locations((-12.75, -78.5)):
            Circle(MIRROR1_OUTLINE_R, mode=Mode.SUBTRACT)
    extrude(amount=MIRROR1_DEPTH)

    # Mirror1 2 outline → Mirror1 2 (add)
    with BuildSketch(Plane.YZ.offset(MIRROR1_START)):
        with BuildLine():
            Line((-21.25, -28.5), (-21.25, -84.325))
            Line((-21.25, -84.325), (-8.1, -84.325))
            Line((-8.1, -84.325), (-8.1, -82.325))
            Line((-8.1, -82.325), (-19.25, -82.325))
            Line((-19.25, -82.325), (-19.25, -30.5))
            Line((-19.25, -30.5), (-6.925, -30.5))
            ThreePointArc((-6.925, -30.5), (-5.864339828, -30.060660172), (-5.425, -29))
            Line((-5.425, -29), (-5.425, -28.5))
            Line((-5.425, -28.5), (-21.25, -28.5))
        make_face()
        Polygon((1.3, -82.325), (1.3, -84.325), (21.25, -84.325), (21.25, -28.5), (19.25, -28.5), (19.25, -82.325), align=None)
    extrude(amount=MIRROR1_2_DEPTH)

    # Mirror1 3 outline → Mirror1 3 (add)
    # profile 1 of 2: a face of its own
    with BuildSketch(Plane.YZ.offset(MIRROR1_START)):
        Polygon((-8.1, -82.325), (-8.1, -84.325), (-5.589027778, -84.325), (-5.400138889, -82.325), align=None)
    # profile 2 of 2: a face of its own
    with BuildSketch(Plane.YZ.offset(MIRROR1_START)):
        with Locations((-12.75, -76.1875)):
            Rectangle(MIRROR1_3_OUTLINE_W, MIRROR1_3_OUTLINE_H)
        with Locations((-12.75, -78.5)):
            Circle(MIRROR1_3_OUTLINE_R, mode=Mode.SUBTRACT)
        with Locations((-12.75, -72)):
            Circle(MIRROR1_3_OUTLINE_R, mode=Mode.SUBTRACT)
    extrude(amount=MIRROR1_3_DEPTH)

    # Mirror1 4 outline → Mirror1 4 (add)
    # profile 1 of 3: a face of its own
    with BuildSketch(Plane.YZ.offset(MIRROR1_START)):
        with BuildLine():
            Line((-5.400138889, -82.325), (-5.589027778, -84.325))
            ThreePointArc((-5.589027778, -84.325), (-3.112667731, -80.217778383), (-2.25, -75.5))
            Line((-2.25, -75.5), (-2.25, -67.5))
            Line((-2.25, -67.5), (-4, -67.5))
            Line((-4, -67.5), (-5.400138889, -82.325))
        make_face()
    # profile 2 of 3: a face of its own
    with BuildSketch(Plane.YZ.offset(MIRROR1_START)):
        with Locations((-12.75, -78.5)):
            Circle(MIRROR1_4_OUTLINE_R)
        with Locations((-12.75, -78.5)):
            Circle(MIRROR1_4_OUTLINE_R_2, mode=Mode.SUBTRACT)
    # profile 3 of 3: a face of its own
    with BuildSketch(Plane.YZ.offset(MIRROR1_START)):
        with Locations((-12.75, -72)):
            Circle(MIRROR1_4_OUTLINE_R)
        with Locations((-12.75, -72)):
            Circle(MIRROR1_4_OUTLINE_R_2, mode=Mode.SUBTRACT)
    extrude(amount=MIRROR1_4_DEPTH)

    # Mirror1 5 outline → Mirror1 5 (add)
    # profile 1 of 2: a face of its own
    with BuildSketch(Plane.YZ.offset(MIRROR1_START_2)):
        with Locations((-12.75, -78.5)):
            Circle(MIRROR1_5_OUTLINE_R)
        with Locations((-12.75, -78.5)):
            Circle(MIRROR1_5_OUTLINE_R_2, mode=Mode.SUBTRACT)
    # profile 2 of 2: a face of its own
    with BuildSketch(Plane.YZ.offset(MIRROR1_START_2)):
        with Locations((-12.75, -72)):
            Circle(MIRROR1_5_OUTLINE_R)
        with Locations((-12.75, -72)):
            Circle(MIRROR1_5_OUTLINE_R_2, mode=Mode.SUBTRACT)
    extrude(amount=MIRROR1_5_DEPTH)

    # Mirror1 6 outline → Mirror1 6 (add)
    with BuildSketch(Plane.YZ.offset(MIRROR1_START_3)):
        Polygon((-8.1, -82.325), (-8.1, -84.325), (-5.589027778, -84.325), (-5.400138889, -82.325), align=None)
    extrude(amount=MIRROR1_6_DEPTH)

    # Mirror1 7 outline → Mirror1 7 (add)
    with BuildSketch(Plane.XY.offset(MIRROR1_START_4)):
        with BuildLine():
            Line((4.2875, -14.75), (2.2875, -14.75))
            Line((2.2875, -14.75), (2.2875, -16.75))
            ThreePointArc((2.2875, -16.75), (2.873286438, -15.335786438), (4.2875, -14.75))
        make_face()
        with BuildLine():
            ThreePointArc((4.2875, -10.75), (2.873286438, -10.164213562), (2.2875, -8.75))
            Line((2.2875, -8.75), (2.2875, -10.75))
            Line((2.2875, -10.75), (4.2875, -10.75))
        make_face()
    extrude(amount=MIRROR1_7_DEPTH)

    # Mirror1 8 outline → Mirror1 8 (add)
    with BuildSketch(Plane.XY.offset(MIRROR1_START_5)):
        Polygon((2.2875, 19.25), (2.2875, 18.25), (4.2875, 19.25), align=None)
    extrude(amount=MIRROR1_8_DEPTH)

    # Sketch6 → Mirror Cut (cut, through all)
    with BuildSketch(Plane.ZY):
        with Locations((1, -0.75)):
            Rectangle(SKETCH6_W, SKETCH6_H)
    extrude(amount=-MIRROR_CUT_DEPTH, mode=Mode.SUBTRACT)

    # Sketch24 → Male Snap (add, symmetric)
    with BuildSketch(Plane.XY.offset(-56.4125)):
        with BuildLine():
            Line((2.2875, -19.25), (17.1875, -19.25))
            Line((17.1875, -19.25), (17.1875, -20.1))
            ThreePointArc((17.1875, -20.1), (17.357231833, -20.4), (17.70180038, -20.409022845))
            Line((17.70180038, -20.409022845), (19.744298548, -19.323007305))
            ThreePointArc((19.744298548, -19.323007305), (20.162685162, -18.383295584), (19.352103778, -17.75))
            Line((19.352103778, -17.75), (15.2875, -17.75))
            Line((15.2875, -17.75), (2.2875, -19.25))
        make_face()
        with BuildLine():
            Line((17.70180038, 20.409022845), (19.744298548, 19.323007305))
            ThreePointArc((19.744298548, 19.323007305), (20.162685162, 18.383295584), (19.352103778, 17.75))
            Line((19.352103778, 17.75), (15.2875, 17.75))
            Line((15.2875, 17.75), (2.2875, 19.25))
            Line((2.2875, 19.25), (17.1875, 19.25))
            Line((17.1875, 19.25), (17.1875, 20.1))
            ThreePointArc((17.1875, 20.1), (17.357231833, 20.4), (17.70180038, 20.409022845))
        make_face()
    extrude(amount=MALE_SNAP_DEPTH, both=True)

    # Sketch34 → Magnet Extrude (add)
    with BuildSketch(Plane(origin=(15.2875, 0, 0), x_dir=(0, 0, -1), z_dir=(1, 0, 0))):
        with Locations((56.4125, -22)):
            Rectangle(SKETCH34_W, SKETCH34_H)
    extrude(amount=-MAGNET_EXTRUDE_DEPTH)

    # Sketch34<5> → Magnet Bottom Cut (cut)
    with BuildSketch(Plane(origin=(15.2875, 0, 0), x_dir=(0, 0, -1), z_dir=(1, 0, 0))):
        with Locations((38.45625, -18.8)):
            Rectangle(SKETCH34_5_W, SKETCH34_5_H)
        Polygon((66.4125, -19.25), (66.4125, -21.25), (84.325, -21.25), (84.325, -18.35), (82.325, -18.35), (82.325, -19.25), align=None)
        with Locations((74.36875, -18.8)):
            Rectangle(SKETCH34_5_W, SKETCH34_5_H)
        Polygon((28.5, -18.35), (28.5, -21.25), (46.4125, -21.25), (46.4125, -19.25), (30.5, -19.25), (30.5, -18.35), align=None)
        with Locations((37.45625, -22)):
            Rectangle(SKETCH34_5_W_2, SKETCH34_5_H_2)
        with Locations((75.36875, -22)):
            Rectangle(SKETCH34_5_W_2, SKETCH34_5_H_2)
    extrude(amount=-MAGNET_BOTTOM_CUT_DEPTH, mode=Mode.SUBTRACT)

    # Sketch36 → Boss-Extrude1 (add)
    with BuildSketch(Plane(origin=(0, 21.25, 0), x_dir=(1, 0, 0), z_dir=(0, 1, 0))):
        with Locations((13.390625, 56.4125)):
            Rectangle(SKETCH36_W, SKETCH36_H)
        with Locations((11.803125, 56.4125)):
            Rectangle(SKETCH36_W, SKETCH36_H)
        with Locations((10.215625, 56.4125)):
            Rectangle(SKETCH36_W, SKETCH36_H)
    extrude(amount=BOSS_EXTRUDE1_DEPTH)

    # Sketch44 → Boss-Extrude5 (add)
    with BuildSketch(Plane(origin=(0, 0, -84.325), x_dir=(-1, 0, 0), z_dir=(0, 0, -1))):
        Polygon((-15.2875, 1.3), (-15.2875, 3.2), (0, 3.2), (0, -9.239027778), (-15.2875, -9.239027778), (-15.2875, -5.589027778), (-2.2875, -5.589027778), (-2.2875, 1.3), align=None)
    extrude(amount=BOSS_EXTRUDE5_DEPTH)

    # Fillet7
    fillet7_edges = [part.edges().sort_by_distance(p)[0] for p in [
        (2.2875, -2.144513889, -87.5),
    ]]
    fillet(fillet7_edges, radius=FILLET7_R)


solid = part.part
